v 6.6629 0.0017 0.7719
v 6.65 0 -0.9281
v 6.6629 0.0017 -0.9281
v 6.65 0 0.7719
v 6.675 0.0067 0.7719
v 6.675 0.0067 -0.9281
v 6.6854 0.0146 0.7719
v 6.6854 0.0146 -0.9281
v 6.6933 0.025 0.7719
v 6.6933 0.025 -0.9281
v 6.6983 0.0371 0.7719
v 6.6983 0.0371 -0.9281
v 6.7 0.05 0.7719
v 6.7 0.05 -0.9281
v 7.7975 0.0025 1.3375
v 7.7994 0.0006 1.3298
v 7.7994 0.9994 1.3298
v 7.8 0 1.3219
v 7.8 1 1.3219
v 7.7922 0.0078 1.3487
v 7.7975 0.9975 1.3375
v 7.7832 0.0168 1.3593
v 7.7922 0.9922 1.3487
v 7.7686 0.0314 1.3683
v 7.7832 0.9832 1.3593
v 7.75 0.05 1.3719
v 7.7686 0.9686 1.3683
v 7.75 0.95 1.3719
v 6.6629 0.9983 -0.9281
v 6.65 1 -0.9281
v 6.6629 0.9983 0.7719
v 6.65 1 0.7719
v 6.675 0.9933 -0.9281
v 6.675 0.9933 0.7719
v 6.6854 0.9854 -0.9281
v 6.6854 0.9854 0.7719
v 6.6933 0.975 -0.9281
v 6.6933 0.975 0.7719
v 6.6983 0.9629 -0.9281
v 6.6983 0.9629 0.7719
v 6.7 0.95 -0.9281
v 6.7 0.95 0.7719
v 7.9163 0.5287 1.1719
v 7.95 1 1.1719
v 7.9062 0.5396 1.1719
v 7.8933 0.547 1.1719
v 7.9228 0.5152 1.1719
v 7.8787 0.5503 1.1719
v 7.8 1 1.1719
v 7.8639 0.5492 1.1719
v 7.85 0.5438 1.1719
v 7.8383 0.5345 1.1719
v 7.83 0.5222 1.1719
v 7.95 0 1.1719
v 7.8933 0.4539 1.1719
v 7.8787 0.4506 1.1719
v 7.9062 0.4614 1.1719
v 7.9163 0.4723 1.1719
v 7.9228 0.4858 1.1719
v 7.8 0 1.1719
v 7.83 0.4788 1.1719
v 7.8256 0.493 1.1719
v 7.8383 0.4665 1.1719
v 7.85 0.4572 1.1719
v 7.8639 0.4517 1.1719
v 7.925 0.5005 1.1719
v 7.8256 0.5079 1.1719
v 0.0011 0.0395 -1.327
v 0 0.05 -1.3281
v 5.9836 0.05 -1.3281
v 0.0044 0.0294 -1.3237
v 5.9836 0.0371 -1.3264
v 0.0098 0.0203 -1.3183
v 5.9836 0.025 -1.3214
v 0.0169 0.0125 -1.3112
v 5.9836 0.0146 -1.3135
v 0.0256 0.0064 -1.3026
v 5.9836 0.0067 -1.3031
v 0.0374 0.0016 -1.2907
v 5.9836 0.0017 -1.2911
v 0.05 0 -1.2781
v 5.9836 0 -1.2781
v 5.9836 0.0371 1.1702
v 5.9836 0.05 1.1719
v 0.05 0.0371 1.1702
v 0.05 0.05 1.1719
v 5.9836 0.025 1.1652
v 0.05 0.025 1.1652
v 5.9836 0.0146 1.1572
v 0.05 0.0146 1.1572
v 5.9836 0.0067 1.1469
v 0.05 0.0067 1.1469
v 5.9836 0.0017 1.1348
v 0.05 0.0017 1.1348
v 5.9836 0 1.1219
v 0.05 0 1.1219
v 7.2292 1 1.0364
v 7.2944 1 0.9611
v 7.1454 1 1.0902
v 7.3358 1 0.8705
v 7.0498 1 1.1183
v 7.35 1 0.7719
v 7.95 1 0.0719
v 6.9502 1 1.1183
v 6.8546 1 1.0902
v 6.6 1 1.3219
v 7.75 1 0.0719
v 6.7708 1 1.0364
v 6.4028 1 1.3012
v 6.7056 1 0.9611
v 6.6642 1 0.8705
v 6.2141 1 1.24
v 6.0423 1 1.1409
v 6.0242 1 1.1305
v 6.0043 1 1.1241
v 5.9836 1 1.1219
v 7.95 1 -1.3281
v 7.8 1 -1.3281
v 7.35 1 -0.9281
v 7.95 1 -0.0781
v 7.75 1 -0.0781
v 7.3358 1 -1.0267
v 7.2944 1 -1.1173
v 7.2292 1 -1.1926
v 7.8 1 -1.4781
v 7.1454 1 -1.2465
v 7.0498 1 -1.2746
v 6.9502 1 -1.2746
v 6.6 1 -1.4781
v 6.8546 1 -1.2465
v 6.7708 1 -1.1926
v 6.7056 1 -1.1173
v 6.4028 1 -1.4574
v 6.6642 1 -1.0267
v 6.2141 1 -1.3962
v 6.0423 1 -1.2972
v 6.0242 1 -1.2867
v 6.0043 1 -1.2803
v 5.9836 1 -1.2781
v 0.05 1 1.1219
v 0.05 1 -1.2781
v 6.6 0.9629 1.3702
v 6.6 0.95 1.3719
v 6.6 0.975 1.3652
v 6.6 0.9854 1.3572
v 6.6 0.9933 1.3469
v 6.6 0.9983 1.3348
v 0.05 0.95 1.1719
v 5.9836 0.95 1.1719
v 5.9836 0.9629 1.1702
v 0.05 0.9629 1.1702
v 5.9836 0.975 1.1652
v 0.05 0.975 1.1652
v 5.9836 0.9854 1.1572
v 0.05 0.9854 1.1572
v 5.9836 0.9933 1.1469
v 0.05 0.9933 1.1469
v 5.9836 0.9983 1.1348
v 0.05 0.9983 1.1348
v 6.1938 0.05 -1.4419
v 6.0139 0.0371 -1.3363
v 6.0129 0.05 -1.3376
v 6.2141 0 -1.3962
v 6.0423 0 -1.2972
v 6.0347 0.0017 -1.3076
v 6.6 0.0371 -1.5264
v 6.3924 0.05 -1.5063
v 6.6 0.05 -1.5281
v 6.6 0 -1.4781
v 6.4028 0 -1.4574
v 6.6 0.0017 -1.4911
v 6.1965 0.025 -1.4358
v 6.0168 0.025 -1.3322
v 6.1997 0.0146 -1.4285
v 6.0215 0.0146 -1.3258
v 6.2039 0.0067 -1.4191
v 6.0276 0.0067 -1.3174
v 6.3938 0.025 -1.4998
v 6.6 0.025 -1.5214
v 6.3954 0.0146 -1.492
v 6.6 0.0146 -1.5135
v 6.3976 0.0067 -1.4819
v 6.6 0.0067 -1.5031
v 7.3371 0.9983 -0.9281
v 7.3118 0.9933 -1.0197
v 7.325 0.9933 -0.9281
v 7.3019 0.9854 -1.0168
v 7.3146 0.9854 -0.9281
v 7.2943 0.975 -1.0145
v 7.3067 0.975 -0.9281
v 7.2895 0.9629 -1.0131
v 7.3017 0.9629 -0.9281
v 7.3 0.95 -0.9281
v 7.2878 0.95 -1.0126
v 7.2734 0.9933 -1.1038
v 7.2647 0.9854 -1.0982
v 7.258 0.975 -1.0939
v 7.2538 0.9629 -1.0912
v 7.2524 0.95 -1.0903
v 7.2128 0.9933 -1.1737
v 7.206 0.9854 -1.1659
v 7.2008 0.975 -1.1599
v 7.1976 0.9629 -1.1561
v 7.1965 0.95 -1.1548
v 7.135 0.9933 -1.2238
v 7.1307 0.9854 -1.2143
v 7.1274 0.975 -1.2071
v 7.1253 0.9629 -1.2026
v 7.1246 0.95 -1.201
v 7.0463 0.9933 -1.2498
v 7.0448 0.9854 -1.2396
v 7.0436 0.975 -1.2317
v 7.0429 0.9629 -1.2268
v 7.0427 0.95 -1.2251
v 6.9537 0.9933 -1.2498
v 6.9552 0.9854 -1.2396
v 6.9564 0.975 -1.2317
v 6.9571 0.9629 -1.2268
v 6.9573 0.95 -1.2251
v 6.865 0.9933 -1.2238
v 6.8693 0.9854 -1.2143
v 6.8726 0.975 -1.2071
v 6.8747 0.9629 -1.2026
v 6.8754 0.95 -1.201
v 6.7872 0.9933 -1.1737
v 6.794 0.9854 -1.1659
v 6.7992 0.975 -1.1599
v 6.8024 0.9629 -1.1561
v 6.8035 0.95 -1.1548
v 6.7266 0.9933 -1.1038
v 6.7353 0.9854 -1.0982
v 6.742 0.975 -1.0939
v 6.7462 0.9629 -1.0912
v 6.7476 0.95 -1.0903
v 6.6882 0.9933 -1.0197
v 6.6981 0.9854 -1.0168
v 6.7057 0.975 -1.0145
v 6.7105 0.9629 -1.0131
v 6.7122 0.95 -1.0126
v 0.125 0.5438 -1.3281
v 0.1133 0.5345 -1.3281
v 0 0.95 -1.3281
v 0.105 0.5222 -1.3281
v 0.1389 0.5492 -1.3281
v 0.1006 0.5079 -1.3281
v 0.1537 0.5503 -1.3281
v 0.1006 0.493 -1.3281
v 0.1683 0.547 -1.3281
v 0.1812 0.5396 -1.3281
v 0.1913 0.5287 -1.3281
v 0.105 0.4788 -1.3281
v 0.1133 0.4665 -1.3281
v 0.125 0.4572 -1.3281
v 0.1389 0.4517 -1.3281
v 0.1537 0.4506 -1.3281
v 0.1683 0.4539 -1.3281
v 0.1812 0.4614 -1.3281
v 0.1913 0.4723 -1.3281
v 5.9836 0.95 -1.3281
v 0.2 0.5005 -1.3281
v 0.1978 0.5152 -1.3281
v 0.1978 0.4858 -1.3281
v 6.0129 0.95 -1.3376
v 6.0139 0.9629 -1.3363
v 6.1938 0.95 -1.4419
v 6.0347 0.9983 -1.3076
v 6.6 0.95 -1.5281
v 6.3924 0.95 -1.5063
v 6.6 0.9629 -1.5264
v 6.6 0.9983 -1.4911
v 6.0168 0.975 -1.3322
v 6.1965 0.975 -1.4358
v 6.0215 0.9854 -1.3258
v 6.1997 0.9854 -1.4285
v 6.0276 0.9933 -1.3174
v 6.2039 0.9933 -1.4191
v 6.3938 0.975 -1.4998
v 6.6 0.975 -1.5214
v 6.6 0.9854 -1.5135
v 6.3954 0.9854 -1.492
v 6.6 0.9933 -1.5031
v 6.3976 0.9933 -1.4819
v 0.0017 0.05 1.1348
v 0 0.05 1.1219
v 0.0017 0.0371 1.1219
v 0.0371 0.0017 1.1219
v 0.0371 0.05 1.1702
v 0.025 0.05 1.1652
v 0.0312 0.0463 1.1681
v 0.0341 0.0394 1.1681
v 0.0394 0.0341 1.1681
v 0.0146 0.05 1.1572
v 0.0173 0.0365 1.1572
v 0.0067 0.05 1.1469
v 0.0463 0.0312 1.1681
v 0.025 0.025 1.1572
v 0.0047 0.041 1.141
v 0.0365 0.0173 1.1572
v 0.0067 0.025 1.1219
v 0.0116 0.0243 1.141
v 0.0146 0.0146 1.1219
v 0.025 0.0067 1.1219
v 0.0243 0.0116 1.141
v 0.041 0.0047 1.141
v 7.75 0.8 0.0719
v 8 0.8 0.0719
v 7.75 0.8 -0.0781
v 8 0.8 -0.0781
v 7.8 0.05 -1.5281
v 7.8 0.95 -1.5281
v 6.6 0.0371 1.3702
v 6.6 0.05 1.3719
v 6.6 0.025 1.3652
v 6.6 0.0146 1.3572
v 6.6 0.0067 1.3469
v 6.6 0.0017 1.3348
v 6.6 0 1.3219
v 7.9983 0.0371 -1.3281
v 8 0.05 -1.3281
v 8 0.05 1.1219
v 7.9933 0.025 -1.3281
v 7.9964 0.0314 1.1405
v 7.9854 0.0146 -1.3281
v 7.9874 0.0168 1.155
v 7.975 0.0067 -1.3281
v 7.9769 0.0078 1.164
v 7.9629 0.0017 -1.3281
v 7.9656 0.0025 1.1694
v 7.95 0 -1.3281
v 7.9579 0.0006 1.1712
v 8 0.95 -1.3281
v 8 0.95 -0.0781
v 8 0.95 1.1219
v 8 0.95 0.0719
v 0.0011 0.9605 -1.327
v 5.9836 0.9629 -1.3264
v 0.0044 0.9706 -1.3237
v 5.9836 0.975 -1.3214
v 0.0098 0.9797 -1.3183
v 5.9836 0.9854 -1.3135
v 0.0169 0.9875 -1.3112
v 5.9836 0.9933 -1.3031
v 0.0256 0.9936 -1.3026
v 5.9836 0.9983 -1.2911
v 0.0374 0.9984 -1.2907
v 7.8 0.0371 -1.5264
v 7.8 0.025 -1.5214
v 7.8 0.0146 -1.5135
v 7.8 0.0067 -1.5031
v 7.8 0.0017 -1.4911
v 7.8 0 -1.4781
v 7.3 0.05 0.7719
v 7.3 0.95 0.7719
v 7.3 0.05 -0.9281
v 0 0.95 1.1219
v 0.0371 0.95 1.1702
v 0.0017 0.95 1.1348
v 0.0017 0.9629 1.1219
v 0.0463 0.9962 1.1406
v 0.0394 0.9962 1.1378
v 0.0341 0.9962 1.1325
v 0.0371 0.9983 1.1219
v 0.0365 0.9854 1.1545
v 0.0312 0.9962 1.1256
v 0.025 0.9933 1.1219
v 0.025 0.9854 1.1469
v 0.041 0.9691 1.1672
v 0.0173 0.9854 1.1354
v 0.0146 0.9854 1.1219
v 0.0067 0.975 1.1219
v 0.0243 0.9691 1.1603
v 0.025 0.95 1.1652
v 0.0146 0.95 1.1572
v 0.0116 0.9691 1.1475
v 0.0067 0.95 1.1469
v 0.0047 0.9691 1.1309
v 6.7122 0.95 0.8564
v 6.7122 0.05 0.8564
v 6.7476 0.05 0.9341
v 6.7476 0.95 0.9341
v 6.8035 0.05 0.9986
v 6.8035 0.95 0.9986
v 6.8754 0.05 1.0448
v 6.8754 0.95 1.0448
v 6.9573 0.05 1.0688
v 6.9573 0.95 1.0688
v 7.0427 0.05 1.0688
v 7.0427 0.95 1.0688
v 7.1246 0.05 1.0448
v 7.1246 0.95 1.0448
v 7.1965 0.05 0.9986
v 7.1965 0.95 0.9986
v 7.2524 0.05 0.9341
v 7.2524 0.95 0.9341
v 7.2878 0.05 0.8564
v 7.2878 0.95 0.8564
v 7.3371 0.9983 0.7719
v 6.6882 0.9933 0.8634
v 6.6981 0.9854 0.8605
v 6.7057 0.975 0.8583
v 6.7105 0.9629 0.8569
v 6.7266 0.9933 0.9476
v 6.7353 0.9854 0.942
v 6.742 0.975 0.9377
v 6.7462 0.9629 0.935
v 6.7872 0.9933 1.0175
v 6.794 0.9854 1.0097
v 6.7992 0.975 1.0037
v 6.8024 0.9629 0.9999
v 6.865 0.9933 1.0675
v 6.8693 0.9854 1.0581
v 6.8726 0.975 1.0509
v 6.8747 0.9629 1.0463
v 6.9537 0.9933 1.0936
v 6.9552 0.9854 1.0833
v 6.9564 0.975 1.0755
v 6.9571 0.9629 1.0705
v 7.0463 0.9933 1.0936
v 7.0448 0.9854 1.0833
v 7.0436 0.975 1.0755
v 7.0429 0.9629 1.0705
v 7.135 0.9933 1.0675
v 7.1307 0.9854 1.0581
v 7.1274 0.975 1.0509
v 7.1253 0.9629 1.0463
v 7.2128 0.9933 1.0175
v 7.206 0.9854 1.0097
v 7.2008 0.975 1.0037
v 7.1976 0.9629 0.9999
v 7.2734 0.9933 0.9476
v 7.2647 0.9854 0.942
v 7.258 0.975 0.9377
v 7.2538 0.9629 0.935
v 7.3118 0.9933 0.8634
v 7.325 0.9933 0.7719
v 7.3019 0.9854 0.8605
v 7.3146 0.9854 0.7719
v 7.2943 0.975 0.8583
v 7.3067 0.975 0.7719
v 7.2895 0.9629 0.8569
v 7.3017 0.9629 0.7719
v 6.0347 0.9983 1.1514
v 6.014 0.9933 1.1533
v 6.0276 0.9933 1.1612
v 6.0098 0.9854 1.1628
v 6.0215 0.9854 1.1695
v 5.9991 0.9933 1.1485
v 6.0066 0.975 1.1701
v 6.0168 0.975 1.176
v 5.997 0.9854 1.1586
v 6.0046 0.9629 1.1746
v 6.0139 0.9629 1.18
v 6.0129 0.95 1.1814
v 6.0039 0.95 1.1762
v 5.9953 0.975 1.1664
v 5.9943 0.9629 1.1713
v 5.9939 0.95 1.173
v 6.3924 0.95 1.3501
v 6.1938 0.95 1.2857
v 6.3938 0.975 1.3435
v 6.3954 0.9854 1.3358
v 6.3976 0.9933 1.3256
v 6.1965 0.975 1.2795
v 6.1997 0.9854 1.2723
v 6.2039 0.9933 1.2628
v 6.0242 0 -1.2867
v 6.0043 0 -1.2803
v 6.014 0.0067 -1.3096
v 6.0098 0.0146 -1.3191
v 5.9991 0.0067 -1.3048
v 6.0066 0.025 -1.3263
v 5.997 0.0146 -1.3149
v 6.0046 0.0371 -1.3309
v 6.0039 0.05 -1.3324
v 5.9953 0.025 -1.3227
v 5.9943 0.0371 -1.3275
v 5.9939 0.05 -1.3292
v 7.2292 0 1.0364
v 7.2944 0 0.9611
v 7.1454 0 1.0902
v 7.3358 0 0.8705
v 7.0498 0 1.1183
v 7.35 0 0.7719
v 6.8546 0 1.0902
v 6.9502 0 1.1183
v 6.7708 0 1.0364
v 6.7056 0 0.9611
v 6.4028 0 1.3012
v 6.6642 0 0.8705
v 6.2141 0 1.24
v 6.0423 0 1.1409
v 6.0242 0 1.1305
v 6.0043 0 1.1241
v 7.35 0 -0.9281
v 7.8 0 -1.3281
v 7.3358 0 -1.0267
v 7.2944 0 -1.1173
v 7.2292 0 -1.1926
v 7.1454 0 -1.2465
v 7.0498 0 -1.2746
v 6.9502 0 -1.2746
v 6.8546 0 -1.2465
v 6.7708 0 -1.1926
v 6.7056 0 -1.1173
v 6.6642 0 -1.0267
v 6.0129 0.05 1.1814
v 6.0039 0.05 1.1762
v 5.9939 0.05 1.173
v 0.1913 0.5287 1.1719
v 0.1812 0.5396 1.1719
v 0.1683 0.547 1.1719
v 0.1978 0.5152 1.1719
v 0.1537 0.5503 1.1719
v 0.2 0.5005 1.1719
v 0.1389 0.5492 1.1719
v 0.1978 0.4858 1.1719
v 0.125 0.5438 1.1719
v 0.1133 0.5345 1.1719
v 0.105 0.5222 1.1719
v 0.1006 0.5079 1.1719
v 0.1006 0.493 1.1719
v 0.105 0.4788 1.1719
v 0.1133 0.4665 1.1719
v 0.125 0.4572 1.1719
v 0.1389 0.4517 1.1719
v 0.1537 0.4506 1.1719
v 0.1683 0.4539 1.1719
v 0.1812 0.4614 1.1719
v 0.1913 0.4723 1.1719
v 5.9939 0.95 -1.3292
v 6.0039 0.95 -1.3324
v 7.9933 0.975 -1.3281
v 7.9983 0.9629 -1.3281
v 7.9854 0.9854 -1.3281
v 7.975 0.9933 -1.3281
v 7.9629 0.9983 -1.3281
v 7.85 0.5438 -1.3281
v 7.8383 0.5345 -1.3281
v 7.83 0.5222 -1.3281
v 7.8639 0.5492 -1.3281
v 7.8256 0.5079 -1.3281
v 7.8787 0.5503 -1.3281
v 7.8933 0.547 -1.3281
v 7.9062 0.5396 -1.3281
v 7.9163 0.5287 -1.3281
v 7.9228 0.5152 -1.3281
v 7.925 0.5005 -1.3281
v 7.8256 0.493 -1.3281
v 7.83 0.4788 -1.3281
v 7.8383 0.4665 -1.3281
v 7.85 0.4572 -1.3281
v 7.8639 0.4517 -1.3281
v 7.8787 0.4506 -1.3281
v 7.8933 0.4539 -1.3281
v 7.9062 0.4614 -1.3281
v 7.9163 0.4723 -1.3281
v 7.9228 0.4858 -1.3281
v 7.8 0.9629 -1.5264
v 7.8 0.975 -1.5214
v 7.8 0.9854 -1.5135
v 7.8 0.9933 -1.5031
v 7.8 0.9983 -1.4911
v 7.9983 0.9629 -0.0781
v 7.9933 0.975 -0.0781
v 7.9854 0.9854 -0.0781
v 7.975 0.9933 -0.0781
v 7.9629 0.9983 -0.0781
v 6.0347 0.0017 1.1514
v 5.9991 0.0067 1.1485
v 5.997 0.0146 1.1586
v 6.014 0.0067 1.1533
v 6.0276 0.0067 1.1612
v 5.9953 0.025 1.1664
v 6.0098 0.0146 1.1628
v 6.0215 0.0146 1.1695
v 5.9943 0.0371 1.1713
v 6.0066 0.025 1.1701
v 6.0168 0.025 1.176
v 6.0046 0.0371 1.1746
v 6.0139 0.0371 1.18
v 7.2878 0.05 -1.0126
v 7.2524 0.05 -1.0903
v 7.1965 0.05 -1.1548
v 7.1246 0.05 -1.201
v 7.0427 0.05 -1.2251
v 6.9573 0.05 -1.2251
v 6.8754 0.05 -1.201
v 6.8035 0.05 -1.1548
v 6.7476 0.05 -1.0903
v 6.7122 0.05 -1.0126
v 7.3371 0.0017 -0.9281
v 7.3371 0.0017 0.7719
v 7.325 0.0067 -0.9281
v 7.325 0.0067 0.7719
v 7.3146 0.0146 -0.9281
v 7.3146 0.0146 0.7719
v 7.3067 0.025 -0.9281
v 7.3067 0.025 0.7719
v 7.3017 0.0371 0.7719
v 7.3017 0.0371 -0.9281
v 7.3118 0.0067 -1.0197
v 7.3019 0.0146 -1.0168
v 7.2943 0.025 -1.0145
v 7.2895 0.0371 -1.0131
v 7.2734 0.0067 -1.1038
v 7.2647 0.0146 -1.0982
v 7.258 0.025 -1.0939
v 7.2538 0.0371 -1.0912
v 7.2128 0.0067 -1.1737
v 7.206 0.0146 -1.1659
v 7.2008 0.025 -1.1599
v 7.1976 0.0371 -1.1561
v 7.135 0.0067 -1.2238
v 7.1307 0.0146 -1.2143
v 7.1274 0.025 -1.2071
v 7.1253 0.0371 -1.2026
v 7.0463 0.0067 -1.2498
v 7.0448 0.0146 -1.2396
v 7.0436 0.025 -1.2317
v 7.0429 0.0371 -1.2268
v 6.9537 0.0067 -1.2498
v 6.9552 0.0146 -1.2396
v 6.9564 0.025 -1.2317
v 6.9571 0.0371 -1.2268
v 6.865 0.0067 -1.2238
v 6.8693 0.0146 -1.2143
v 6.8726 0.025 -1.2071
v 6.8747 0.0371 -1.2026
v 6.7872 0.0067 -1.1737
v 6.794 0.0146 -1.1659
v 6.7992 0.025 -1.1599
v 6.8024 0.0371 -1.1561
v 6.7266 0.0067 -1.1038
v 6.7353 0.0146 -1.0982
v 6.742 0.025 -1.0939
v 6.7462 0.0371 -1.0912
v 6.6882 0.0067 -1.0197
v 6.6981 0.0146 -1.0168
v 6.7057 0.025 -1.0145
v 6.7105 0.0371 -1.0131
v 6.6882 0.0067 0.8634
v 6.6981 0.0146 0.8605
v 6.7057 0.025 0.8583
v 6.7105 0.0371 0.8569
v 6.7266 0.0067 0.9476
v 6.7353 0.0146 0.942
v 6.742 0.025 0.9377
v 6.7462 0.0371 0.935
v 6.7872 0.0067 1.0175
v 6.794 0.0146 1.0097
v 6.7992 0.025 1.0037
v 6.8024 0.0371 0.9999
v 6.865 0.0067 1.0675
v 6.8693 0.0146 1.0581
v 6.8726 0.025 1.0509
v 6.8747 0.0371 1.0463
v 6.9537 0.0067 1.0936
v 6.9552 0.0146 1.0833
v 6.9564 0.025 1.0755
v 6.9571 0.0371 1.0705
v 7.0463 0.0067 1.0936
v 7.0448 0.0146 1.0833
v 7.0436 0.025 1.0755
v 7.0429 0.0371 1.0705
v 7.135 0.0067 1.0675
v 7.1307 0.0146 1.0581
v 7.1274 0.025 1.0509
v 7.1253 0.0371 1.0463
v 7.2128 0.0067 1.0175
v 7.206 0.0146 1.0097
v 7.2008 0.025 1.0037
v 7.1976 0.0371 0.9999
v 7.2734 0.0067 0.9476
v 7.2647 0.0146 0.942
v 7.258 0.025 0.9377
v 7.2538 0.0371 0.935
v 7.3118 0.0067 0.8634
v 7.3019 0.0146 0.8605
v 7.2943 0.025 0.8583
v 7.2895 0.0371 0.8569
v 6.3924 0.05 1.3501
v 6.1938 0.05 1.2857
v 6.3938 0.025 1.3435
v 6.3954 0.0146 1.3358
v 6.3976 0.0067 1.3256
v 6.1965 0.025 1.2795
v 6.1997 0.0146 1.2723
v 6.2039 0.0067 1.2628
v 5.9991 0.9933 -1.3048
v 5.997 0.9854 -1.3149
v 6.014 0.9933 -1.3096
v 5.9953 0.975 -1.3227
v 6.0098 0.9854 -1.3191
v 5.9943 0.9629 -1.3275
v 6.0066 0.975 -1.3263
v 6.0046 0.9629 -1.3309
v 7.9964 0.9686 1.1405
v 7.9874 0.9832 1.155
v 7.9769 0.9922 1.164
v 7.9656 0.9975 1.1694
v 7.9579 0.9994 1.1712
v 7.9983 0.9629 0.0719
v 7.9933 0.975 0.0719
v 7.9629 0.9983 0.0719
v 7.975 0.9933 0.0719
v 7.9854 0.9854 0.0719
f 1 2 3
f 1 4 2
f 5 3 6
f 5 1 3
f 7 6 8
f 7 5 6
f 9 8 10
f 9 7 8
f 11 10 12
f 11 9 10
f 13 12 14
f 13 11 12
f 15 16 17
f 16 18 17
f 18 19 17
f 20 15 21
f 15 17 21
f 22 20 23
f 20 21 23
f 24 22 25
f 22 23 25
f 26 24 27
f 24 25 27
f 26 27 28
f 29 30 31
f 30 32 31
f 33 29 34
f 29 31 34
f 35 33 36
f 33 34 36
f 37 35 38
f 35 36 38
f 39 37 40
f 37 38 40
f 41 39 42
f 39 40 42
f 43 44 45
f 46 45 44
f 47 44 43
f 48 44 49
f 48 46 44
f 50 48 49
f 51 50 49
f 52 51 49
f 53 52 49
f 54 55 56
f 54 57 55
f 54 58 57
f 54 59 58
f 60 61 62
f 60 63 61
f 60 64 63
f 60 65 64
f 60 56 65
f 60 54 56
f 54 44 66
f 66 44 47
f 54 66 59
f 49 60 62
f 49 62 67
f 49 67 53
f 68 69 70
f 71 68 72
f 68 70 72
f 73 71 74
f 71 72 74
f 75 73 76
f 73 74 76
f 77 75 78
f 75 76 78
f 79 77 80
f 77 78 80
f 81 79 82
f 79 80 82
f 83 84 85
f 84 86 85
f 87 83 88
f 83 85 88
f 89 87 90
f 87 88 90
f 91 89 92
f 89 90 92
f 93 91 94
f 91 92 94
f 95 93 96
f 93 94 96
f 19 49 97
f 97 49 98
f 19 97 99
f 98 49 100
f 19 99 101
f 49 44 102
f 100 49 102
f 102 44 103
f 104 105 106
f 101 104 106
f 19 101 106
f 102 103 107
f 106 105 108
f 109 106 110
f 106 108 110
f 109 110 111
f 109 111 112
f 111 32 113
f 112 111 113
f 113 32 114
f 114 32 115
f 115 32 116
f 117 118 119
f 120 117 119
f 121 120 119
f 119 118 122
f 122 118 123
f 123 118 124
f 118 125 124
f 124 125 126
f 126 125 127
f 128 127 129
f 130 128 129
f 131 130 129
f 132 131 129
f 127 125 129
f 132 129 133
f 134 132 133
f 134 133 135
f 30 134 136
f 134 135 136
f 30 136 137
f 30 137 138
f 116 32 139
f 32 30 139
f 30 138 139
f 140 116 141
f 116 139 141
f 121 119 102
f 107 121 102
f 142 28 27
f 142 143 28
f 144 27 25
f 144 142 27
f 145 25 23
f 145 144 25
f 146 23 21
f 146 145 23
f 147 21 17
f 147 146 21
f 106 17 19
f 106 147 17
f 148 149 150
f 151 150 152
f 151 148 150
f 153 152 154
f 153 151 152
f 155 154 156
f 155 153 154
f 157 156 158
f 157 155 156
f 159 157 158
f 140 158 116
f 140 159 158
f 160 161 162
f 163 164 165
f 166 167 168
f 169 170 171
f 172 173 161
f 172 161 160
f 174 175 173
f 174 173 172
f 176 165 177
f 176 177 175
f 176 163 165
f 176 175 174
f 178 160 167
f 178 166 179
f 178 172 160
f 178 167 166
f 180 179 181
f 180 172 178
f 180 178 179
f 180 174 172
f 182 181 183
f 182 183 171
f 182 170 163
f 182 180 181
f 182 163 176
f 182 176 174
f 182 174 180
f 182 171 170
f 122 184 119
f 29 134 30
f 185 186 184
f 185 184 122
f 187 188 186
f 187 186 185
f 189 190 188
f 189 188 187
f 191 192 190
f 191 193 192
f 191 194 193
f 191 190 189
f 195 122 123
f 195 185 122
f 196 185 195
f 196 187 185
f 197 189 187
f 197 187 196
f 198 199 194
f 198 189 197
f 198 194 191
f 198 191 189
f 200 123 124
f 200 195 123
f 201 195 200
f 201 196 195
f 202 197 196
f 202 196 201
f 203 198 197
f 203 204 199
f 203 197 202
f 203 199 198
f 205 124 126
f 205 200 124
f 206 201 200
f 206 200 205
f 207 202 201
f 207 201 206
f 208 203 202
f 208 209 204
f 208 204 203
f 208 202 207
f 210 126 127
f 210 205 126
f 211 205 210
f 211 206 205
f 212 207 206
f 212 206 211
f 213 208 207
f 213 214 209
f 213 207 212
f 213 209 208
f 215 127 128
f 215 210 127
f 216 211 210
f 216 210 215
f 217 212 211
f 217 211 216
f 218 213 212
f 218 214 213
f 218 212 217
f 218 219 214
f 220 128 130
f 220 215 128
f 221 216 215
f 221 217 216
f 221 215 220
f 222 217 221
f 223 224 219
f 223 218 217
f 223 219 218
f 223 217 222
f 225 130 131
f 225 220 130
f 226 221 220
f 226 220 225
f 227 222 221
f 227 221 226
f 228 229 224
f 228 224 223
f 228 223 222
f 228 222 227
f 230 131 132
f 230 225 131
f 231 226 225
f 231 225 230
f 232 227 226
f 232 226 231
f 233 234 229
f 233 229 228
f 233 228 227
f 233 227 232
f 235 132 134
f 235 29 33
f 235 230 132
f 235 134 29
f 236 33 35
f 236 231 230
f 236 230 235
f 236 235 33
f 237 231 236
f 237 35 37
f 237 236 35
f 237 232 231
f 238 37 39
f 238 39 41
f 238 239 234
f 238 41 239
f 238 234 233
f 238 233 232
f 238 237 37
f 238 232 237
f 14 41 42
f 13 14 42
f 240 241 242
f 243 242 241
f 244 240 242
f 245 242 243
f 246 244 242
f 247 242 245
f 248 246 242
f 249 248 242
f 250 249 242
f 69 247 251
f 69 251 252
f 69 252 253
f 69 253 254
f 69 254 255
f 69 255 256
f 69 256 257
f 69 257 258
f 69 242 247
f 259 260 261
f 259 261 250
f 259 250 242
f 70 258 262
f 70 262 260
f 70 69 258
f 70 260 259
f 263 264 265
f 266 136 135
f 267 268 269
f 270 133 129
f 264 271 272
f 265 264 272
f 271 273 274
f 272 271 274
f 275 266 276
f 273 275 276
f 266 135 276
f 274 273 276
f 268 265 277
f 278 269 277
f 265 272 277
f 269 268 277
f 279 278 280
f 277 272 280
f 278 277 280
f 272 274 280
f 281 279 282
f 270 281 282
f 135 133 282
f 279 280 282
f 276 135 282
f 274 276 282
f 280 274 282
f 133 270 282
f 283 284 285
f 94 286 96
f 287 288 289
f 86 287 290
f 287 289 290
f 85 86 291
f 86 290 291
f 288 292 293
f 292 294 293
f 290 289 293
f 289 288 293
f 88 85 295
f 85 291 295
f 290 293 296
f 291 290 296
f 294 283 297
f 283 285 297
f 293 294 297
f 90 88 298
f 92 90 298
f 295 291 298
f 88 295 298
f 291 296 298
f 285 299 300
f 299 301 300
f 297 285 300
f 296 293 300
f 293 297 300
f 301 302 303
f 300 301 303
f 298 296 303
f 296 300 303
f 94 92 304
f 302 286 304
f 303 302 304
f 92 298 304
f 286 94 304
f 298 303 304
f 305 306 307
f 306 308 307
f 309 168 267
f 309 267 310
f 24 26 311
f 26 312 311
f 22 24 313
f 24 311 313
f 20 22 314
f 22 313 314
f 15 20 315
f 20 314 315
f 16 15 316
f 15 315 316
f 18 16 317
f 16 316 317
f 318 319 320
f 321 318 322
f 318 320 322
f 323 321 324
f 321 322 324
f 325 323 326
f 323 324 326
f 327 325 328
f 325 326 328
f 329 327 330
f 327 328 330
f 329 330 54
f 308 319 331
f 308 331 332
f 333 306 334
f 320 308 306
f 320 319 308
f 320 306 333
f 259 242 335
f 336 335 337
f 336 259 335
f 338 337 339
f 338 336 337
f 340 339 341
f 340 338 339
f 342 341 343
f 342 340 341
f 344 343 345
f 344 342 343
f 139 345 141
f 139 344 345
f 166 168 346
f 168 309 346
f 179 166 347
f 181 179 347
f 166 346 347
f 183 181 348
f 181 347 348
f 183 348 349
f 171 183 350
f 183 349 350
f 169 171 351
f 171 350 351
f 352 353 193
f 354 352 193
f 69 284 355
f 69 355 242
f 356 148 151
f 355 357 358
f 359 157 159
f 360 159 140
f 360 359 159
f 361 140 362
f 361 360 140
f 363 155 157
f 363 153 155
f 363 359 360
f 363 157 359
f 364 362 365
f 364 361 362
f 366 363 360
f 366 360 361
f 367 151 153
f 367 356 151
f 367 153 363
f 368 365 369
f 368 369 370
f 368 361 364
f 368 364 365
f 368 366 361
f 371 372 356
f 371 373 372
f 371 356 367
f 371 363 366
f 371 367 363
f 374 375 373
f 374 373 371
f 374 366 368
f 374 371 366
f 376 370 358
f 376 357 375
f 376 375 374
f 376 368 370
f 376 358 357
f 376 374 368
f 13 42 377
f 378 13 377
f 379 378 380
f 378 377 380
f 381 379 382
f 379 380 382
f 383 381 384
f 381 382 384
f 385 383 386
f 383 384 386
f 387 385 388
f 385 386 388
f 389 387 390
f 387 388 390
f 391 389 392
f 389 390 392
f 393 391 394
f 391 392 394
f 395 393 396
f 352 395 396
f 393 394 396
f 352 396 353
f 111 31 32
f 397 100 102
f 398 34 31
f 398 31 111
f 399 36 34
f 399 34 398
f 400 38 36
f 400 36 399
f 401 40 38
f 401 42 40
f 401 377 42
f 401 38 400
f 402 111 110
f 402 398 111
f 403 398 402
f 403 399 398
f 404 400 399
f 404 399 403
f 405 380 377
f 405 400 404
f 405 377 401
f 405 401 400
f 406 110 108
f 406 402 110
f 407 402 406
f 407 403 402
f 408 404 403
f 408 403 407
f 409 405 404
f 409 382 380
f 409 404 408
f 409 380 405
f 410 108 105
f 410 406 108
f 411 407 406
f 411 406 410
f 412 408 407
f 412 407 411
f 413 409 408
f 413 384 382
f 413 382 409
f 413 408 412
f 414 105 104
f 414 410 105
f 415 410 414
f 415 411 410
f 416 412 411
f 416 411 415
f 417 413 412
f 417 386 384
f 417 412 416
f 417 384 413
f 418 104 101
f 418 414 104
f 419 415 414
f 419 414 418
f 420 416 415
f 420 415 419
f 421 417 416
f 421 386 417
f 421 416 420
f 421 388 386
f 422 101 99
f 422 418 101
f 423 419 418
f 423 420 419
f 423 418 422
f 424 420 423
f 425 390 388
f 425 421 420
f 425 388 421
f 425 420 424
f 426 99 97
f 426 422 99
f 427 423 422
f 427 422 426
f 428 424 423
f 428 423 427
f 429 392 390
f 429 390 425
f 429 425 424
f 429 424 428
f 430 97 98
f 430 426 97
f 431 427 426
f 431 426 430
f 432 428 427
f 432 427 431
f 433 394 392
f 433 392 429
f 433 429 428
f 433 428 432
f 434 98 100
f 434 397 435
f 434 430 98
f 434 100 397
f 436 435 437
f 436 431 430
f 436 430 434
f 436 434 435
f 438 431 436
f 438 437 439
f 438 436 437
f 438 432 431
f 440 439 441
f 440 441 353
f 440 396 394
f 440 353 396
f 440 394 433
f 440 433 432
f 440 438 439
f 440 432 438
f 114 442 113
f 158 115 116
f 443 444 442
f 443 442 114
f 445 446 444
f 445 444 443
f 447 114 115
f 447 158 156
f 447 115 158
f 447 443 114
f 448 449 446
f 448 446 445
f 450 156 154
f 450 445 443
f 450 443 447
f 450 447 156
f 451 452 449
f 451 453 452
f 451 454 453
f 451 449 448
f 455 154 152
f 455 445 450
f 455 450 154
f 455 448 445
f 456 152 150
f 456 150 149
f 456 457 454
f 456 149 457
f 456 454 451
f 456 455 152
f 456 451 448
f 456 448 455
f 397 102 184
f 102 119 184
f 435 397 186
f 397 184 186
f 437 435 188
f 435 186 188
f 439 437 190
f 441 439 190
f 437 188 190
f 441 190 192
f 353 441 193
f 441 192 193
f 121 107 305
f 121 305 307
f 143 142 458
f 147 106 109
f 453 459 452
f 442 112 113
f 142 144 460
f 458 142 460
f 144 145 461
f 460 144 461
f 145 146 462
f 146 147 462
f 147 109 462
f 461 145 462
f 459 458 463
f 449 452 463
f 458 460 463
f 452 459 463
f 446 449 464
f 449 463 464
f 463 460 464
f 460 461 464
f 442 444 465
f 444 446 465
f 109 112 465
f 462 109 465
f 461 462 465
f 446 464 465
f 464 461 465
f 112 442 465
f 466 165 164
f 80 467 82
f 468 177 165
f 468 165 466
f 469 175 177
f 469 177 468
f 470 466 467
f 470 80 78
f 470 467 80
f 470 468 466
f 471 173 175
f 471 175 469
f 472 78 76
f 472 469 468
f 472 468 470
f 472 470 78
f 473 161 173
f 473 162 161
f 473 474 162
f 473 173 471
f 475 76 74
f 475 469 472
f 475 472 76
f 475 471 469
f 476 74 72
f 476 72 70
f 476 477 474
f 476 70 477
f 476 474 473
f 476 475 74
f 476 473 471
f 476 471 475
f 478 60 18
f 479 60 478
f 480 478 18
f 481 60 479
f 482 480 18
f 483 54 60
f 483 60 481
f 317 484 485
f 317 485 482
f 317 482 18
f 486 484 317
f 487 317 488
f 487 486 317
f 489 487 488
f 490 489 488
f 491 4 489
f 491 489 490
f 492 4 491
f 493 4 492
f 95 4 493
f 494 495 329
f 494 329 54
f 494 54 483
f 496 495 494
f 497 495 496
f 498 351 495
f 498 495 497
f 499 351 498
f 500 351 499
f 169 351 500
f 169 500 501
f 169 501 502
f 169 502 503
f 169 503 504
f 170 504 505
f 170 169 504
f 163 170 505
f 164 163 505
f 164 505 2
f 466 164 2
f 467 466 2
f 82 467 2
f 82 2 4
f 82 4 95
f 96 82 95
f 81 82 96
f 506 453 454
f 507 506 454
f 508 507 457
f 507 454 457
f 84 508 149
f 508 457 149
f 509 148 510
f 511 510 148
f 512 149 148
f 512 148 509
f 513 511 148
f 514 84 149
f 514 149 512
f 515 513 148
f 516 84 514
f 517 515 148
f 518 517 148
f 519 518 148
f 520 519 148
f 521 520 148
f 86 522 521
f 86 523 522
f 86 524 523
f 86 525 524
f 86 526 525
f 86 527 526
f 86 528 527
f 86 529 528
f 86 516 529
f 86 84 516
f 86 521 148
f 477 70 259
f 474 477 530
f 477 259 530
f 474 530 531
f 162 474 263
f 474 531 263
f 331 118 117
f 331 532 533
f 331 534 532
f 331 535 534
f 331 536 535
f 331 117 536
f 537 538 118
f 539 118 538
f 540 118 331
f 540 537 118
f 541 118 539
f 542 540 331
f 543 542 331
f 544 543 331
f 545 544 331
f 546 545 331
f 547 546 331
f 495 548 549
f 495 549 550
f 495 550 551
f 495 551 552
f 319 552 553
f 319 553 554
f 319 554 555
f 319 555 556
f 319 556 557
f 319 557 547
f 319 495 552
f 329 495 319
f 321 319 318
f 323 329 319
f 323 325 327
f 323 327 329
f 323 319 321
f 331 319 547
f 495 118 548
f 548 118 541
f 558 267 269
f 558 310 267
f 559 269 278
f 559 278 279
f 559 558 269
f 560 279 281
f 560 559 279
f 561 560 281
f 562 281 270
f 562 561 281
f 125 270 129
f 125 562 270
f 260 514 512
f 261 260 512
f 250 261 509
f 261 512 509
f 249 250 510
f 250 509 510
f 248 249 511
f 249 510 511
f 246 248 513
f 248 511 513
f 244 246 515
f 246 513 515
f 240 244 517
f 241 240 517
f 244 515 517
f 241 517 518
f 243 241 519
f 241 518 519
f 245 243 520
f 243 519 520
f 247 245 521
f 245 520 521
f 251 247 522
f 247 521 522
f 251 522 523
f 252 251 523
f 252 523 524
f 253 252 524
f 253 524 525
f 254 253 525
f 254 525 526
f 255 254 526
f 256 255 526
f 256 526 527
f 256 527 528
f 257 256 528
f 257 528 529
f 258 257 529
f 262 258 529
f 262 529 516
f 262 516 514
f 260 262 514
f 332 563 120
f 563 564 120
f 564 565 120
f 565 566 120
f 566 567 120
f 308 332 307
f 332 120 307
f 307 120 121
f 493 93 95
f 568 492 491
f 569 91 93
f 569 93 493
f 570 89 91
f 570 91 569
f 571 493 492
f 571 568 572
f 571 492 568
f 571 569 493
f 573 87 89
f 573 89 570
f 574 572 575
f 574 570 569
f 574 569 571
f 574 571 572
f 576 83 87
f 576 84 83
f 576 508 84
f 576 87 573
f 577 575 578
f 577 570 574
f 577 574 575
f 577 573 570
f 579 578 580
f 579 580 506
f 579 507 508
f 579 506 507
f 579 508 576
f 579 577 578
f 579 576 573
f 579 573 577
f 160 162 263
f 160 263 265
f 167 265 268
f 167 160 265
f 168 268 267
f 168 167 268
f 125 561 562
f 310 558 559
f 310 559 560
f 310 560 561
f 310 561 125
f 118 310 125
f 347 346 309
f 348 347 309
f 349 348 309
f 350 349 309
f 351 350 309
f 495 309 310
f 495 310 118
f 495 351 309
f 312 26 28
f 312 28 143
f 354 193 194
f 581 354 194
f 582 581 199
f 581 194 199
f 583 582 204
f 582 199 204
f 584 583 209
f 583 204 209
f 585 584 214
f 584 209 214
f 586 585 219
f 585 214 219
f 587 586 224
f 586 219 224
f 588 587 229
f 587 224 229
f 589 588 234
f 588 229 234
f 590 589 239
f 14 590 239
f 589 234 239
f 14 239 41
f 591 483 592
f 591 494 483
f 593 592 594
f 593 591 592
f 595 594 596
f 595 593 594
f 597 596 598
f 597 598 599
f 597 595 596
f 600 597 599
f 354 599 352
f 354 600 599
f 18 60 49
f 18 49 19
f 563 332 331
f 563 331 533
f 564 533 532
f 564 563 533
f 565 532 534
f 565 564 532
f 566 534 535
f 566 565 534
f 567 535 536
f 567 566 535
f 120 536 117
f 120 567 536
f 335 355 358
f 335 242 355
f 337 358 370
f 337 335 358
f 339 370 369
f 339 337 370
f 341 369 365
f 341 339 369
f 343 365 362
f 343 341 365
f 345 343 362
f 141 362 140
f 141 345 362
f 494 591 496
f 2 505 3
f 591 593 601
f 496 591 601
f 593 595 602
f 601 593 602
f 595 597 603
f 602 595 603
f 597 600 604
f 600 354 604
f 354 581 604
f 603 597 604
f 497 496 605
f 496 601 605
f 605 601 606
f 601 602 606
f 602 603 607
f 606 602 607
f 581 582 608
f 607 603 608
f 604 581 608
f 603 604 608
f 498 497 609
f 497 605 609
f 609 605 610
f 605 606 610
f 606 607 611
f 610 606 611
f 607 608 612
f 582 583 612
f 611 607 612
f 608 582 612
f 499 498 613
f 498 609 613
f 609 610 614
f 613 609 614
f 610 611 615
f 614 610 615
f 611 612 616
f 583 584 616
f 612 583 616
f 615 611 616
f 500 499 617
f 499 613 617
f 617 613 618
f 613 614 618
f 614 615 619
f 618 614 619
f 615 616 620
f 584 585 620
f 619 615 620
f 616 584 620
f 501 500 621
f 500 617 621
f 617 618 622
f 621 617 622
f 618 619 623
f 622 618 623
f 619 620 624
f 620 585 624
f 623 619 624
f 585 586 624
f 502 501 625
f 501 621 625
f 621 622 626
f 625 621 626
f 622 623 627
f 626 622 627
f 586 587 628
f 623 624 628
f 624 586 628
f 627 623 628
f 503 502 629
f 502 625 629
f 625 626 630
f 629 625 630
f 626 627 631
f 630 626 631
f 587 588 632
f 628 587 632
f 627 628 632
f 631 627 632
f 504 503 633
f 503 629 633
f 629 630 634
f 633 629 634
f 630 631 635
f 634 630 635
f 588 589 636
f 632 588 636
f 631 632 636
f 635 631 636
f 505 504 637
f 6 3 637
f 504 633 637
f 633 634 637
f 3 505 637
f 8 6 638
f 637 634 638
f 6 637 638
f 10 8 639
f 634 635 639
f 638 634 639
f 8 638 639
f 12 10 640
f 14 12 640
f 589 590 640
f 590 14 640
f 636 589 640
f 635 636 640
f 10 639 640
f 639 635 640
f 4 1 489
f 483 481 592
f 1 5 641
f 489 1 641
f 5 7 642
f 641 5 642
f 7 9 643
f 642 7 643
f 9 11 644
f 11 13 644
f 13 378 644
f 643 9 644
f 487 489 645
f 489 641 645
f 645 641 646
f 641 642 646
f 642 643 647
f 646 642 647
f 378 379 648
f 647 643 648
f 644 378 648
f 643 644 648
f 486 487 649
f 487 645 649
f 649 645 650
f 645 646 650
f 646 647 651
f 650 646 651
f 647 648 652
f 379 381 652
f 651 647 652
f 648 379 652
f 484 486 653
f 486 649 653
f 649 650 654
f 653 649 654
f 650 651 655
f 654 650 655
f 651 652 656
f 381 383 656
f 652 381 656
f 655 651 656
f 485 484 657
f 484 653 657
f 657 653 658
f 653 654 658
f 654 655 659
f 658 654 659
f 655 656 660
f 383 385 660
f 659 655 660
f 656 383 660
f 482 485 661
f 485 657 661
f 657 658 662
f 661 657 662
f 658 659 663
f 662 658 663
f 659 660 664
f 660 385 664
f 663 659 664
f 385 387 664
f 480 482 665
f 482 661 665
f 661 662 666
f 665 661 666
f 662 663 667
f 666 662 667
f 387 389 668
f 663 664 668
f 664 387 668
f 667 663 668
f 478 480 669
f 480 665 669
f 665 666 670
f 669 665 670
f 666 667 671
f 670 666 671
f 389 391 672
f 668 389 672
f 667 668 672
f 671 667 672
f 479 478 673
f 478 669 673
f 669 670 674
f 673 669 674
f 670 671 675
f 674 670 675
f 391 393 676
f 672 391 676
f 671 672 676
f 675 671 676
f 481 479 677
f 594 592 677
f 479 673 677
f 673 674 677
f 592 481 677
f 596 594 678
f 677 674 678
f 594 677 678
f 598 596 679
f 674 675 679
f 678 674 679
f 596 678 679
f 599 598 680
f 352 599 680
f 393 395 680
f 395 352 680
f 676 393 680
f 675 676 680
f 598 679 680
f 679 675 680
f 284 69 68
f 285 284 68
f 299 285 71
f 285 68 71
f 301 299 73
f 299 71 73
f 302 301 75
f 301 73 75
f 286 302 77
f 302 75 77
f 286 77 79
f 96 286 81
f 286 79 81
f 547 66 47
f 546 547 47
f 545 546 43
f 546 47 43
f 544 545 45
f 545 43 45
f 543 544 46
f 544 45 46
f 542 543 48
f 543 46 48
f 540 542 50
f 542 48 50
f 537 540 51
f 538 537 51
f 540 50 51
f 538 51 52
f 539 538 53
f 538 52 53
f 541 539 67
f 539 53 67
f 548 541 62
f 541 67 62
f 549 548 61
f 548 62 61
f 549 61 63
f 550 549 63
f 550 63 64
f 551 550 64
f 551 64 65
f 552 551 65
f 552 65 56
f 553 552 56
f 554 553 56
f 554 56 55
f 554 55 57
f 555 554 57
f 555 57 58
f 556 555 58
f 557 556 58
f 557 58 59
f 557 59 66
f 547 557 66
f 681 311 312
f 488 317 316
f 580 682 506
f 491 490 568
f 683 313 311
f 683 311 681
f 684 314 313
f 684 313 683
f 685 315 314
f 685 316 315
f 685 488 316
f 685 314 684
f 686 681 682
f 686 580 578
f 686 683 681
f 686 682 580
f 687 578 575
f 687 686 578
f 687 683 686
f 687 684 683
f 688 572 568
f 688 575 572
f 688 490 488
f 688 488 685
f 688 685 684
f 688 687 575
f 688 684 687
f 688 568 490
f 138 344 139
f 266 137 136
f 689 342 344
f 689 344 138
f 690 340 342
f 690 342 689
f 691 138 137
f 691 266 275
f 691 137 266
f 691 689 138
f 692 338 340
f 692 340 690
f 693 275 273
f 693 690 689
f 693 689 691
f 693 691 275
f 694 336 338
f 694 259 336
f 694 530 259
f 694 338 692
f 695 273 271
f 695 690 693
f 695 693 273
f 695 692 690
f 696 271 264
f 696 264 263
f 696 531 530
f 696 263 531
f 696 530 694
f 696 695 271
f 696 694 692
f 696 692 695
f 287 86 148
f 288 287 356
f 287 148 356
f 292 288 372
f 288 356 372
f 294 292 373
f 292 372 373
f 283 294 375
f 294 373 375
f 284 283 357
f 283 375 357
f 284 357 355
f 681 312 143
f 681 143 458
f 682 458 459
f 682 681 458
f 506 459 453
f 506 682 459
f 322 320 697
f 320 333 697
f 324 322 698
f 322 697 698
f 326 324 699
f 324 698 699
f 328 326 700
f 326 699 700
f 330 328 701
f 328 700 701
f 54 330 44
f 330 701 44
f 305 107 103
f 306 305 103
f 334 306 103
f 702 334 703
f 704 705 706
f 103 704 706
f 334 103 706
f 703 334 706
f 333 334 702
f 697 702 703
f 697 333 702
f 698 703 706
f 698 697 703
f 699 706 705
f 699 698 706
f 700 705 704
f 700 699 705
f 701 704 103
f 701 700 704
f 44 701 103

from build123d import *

# Parameters (mm, degrees)
SALIENTE_EXTRUIR1_DEPTH = 1
REDONDEO1_R             = 0.05
CORTAR_EXTRUIR1_DEPTH   = 1
REDONDEO2_R             = 0.05
CROQUIS3_R              = 0.05
CORTAR_EXTRUIR2_DEPTH   = 9.502352647
CORTAR_EXTRUIR3_DEPTH   = 0.2


with BuildPart() as part:
    # Croquis1 → Saliente-Extruir1 (new body)
    with BuildSketch(Plane(origin=(0, 0, 0), x_dir=(1, 0, 0), z_dir=(0, 1, 0))):
        with BuildLine():
            Line((0, 0), (0, 1.328125))
            Line((0, 1.328125), (6, 1.328125))
            ThreePointArc((6, 1.328125), (6.283772234, 1.476808298), (6.6, 1.528125))
            Line((6.6, 1.528125), (7.8, 1.528125))
            Line((7.8, 1.528125), (7.8, 1.328125))
            Line((7.8, 1.328125), (8, 1.328125))
            Line((8, 1.328125), (8, -1.171875))
            Line((8, -1.171875), (7.8, -1.171875))
            Line((7.8, -1.171875), (7.8, -1.371875))
            Line((7.8, -1.371875), (6.6, -1.371875))
            ThreePointArc((6.6, -1.371875), (6.283772234, -1.320558298), (6, -1.171875))
            Line((6, -1.171875), (0, -1.171875))
            Line((0, -1.171875), (0, 0))
        make_face()
    extrude(amount=SALIENTE_EXTRUIR1_DEPTH)

    # Redondeo1
    redondeo1_edges = [part.edges().sort_by_distance(p)[0] for p in [
        (8, 0, -0.078125),
        (6.283772234, 0, -1.476808298),
        (3, 0, -1.328125),
        (0, 0, -0.078125),
        (6.283772234, 0, 1.320558298),
        (0, 0.5, 1.171875),
        (6, 0.5, 1.171875),
        (3, 0, 1.171875),
        (3, 1, -1.328125),
        (6.283772234, 1, -1.476808298),
        (8, 1, -0.078125),
        (6.283772234, 1, 1.320558298),
        (3, 1, 1.171875),
        (0, 1, -0.078125),
        (7.2, 0, 1.371875),
        (7.2, 0, -1.528125),
        (7.2, 1, -1.528125),
        (7.2, 1, 1.371875),
        (7.8, 0.5, 1.371875),
        (8, 0.5, 1.171875),
        (6, 0.5, -1.328125),
    ]]
    fillet(redondeo1_edges, radius=REDONDEO1_R)

    # Croquis2 → Cortar-Extruir1 (cut)
    with BuildSketch(Plane(origin=(0, 1, 0), x_dir=(1, 0, 0), z_dir=(0, 1, 0))):
        with BuildLine():
            Line((7.3, -0.771875), (7.3, 0.928125))
            ThreePointArc((7.3, 0.928125), (7, 1.228125), (6.7, 0.928125))
            Line((6.7, 0.928125), (6.7, -0.771875))
            ThreePointArc((6.7, -0.771875), (7, -1.071875), (7.3, -0.771875))
        make_face()
    extrude(amount=-CORTAR_EXTRUIR1_DEPTH, mode=Mode.SUBTRACT)

    # Redondeo2
    redondeo2_edges = [part.edges().sort_by_distance(p)[0] for p in [
        (7, 0, -1.228125),
        (7.3, 0, -0.078125),
        (7, 0, 1.071875),
        (6.7, 0, -0.078125),
        (7, 1, -1.228125),
        (6.7, 1, -0.078125),
        (7, 1, 1.071875),
        (7.3, 1, -0.078125),
    ]]
    fillet(redondeo2_edges, radius=REDONDEO2_R)

    # Croquis3 → Cortar-Extruir2 (cut, through all)
    with BuildSketch(Plane.XY.offset(1.171875)):
        with Locations((7.875, 0.500489471)):
            Circle(CROQUIS3_R)
        with Locations((0.15, 0.500489471)):
            Circle(CROQUIS3_R)
    extrude(amount=-CORTAR_EXTRUIR2_DEPTH, mode=Mode.SUBTRACT)

    # Croquis4 → Cortar-Extruir3 (cut)
    with BuildSketch(Plane(origin=(0, 1, 0), x_dir=(1, 0, 0), z_dir=(0, 1, 0))):
        Polygon((7.95, -0.071875), (7.75, -0.071875), (7.75, 0.078125), (7.95, 0.078125), (8.181877464, 0.078125), (8.181877464, -0.071875), align=None)
    extrude(amount=-CORTAR_EXTRUIR3_DEPTH, mode=Mode.SUBTRACT)


solid = part.part
